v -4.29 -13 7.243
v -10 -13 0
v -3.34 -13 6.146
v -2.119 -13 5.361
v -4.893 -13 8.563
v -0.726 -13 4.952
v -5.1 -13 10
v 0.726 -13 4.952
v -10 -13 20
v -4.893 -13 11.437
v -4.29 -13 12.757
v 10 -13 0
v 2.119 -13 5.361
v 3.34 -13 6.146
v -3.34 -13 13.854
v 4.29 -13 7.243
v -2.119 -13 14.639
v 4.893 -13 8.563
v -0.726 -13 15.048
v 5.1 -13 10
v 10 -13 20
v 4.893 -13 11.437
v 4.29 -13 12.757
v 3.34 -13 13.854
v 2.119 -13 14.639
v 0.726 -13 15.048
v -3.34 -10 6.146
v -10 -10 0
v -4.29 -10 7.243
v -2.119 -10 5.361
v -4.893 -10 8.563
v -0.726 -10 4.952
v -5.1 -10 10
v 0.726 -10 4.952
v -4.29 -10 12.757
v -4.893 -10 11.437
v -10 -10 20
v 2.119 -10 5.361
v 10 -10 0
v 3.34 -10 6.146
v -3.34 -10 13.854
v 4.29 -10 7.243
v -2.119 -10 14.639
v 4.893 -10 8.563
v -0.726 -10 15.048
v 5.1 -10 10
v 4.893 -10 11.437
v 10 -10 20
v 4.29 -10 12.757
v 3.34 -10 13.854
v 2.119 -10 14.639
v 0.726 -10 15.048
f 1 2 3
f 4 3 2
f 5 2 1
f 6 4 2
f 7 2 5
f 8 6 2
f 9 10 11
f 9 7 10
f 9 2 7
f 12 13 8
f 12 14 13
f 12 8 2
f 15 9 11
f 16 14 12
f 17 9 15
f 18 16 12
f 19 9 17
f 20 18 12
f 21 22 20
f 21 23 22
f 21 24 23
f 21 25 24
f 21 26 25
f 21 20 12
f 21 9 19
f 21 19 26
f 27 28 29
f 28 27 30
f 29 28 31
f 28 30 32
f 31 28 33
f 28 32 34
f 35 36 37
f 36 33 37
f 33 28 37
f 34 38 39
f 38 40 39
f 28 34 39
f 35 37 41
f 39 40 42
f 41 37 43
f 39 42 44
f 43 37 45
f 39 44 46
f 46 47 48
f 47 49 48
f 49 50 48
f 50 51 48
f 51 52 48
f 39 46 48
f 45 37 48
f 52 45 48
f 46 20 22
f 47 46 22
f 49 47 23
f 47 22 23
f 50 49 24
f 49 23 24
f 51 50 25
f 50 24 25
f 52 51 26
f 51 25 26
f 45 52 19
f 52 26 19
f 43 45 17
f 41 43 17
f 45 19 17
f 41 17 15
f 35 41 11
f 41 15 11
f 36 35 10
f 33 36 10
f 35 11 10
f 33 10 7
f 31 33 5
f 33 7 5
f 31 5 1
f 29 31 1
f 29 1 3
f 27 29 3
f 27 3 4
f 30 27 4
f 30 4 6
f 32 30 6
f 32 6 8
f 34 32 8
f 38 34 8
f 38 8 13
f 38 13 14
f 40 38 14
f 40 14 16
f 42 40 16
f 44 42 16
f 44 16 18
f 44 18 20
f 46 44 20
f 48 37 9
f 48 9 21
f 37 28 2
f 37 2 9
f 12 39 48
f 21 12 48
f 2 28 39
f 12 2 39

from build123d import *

# Parameters (mm, degrees)
SKETCH001_W  = 20
SKETCH001_H  = 20
PAD_DEPTH    = 3
SKETCH002_R  = 5.1
POCKET_DEPTH = 5


with BuildPart() as part:
    # Sketch001 → Pad (new body)
    with BuildSketch(Plane.XZ.offset(10)):
        with Locations((0, 10)):
            Rectangle(SKETCH001_W, SKETCH001_H)
    extrude(amount=PAD_DEPTH)

    # Sketch002 → Pocket (cut)
    with BuildSketch(Plane.XZ.offset(14)):
        with Locations((0, 10)):
            Circle(SKETCH002_R)
    extrude(amount=-POCKET_DEPTH, mode=Mode.SUBTRACT)


solid = part.part
